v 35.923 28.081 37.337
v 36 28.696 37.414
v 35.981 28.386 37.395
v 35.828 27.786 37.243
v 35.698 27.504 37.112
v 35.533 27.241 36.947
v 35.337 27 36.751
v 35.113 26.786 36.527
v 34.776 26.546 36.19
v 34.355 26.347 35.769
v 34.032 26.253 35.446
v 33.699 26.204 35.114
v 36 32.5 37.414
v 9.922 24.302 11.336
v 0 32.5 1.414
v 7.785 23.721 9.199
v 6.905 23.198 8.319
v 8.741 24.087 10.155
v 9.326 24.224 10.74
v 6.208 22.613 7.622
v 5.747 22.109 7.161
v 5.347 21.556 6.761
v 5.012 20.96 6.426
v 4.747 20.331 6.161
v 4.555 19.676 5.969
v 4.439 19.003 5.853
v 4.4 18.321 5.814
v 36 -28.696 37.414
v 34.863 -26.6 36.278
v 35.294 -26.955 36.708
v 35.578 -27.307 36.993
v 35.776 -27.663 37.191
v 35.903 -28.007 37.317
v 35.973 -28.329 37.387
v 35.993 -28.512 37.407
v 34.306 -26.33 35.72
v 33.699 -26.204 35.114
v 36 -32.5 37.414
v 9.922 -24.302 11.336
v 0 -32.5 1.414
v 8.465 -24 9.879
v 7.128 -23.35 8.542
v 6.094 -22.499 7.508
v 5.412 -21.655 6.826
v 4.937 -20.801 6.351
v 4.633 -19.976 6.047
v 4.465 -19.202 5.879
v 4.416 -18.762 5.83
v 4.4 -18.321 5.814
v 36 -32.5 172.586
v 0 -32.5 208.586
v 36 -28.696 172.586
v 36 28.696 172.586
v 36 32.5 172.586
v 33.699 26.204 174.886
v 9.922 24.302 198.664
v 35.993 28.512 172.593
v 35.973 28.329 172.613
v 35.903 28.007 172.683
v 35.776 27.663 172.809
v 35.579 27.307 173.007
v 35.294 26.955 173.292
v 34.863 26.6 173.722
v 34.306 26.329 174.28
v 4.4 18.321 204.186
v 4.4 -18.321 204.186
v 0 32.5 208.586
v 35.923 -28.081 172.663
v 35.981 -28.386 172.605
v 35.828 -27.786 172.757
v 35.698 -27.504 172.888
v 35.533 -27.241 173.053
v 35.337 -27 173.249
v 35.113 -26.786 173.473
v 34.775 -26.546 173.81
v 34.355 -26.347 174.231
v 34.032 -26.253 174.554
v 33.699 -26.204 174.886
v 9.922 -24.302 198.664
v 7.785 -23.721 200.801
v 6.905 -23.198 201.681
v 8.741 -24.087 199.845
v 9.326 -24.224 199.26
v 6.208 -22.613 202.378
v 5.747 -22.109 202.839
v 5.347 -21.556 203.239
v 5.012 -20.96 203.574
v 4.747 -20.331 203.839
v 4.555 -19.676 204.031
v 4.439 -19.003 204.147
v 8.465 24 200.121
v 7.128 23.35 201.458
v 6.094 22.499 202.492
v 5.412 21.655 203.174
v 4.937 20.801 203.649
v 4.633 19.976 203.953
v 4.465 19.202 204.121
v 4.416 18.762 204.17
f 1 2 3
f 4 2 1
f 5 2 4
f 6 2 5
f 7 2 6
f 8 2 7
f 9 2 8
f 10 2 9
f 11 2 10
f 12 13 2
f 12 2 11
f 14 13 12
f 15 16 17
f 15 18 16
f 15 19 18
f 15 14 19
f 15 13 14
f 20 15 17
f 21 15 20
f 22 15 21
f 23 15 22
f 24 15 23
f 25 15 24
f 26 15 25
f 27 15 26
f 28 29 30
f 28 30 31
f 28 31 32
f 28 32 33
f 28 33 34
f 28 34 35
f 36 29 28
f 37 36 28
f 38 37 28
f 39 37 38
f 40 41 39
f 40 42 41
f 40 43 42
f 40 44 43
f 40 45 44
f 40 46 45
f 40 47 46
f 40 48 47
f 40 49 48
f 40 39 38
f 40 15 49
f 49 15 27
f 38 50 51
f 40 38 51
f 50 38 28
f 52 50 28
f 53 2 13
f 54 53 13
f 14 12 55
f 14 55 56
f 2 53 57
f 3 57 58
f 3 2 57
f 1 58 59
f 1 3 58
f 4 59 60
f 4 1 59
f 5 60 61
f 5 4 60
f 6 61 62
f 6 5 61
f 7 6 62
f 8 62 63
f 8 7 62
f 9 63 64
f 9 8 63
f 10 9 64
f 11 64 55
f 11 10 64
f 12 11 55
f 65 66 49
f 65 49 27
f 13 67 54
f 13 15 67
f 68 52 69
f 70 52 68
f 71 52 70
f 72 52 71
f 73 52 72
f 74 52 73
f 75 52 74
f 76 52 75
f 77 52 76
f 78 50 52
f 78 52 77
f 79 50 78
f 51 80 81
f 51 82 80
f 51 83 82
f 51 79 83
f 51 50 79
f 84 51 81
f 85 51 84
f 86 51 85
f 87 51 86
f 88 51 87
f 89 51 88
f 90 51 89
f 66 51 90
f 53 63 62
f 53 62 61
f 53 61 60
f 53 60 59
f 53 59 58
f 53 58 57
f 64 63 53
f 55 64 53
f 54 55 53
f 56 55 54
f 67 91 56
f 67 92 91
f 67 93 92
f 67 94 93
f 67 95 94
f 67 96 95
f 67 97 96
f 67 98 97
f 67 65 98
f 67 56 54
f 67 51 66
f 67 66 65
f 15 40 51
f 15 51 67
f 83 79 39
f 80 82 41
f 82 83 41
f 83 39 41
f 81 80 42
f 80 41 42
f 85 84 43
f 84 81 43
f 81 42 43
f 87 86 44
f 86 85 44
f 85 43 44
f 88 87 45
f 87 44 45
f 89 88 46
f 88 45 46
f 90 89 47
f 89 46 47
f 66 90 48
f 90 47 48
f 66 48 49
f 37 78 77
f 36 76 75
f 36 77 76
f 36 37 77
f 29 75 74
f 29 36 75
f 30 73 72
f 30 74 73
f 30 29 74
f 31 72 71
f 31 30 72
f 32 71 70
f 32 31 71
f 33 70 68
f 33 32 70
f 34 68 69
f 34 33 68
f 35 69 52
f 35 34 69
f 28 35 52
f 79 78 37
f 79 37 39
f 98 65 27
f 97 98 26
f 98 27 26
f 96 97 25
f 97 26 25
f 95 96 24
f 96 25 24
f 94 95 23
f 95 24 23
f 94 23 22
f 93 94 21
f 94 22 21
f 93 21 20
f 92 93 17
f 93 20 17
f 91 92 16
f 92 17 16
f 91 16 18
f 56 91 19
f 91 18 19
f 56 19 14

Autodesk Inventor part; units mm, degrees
ref_plane "Начальная плоскость" through (0, 0, 1.4142) normal (0, 0, 1) x (1, 0, 0)
ref_plane "Конечная плоскость" through (0, 0, 208.5858) normal (0, 0, 1) x (1, 0, 0)
sketch "Эскиз" plane through (0, 0, 0) normal (0, 0, 1) x (1, 0, 0)
  line L0 (36, -32.5) -> (0, -32.5)
  line L1 (36, -32.5) -> (36, -28.696)
  line L2 (33.6994, -26.2039) -> (9.9215, -24.3017)
  line L3 (4.4, -18.3208) -> (4.4, 18.3208)
  line L4 (33.6994, 26.2039) -> (9.9215, 24.3017)
  line L5 (36, 28.696) -> (36, 32.5)
  line L6 (0, 32.5) -> (36, 32.5)
  line L7 (0, -32.5) -> (0, 32.5)
  arc A0 (4.4, -18.3208) -> (9.9215, -24.3017) centre (10.4, -18.3208) ccw
  arc A1 (9.9215, 24.3017) -> (4.4, 18.3208) centre (10.4, 18.3208) ccw
  arc A2 (36, -28.696) -> (33.6994, -26.2039) centre (33.5, -28.696) ccw
  arc A3 (33.6994, 26.2039) -> (36, 28.696) centre (33.5, 28.696) ccw
  line L8 (0, 45.5) -> (0, -45.5) construction
  line L9 (-7.2974, 0) -> (43.7847, 0) construction
  point P0 (36, -26.388)
  point P1 (4.4, -23.86)
  point P2 (4.4, 23.86)
  point P3 (36, 26.388)
  dimension "d3" = 36
  dimension "d5" = 4.4
  dimension "d7" = 65
  dimension "d9" = 8.64
  dimension "d11" = 8.64
  dimension "d13" = 6.112
  dimension "d15" = 6.112
  dimension "d22" = 6
  dimension "d23" = 2.5
  dimension "d24" = 32.5
  dimension "d25" = 0
extrude "Тело" add sketch "Эскиз" along normal up to surface (207.1716 mm away) from surface at 1.4142
sketch "Sketch3" plane through (0, 0, 0) normal (0, 0, 1) x (1, 0, 0)
  line L0 (0, 0) -> (10, 0)
ref_plane "Work Plane7" through (0, 0, 0) normal (0, -1, 0) x (1, 0, 0)
sketch "Sketch4" plane through (0, 0, 0) normal (0, -1, 0) x (1, 0, 0)
  line L0 (-2, 1.4142) -> (12, 1.4142)
  line L1 (-2, 208.5858) -> (12, 208.5858)
  dimension "d29" = 207.1716
ref_plane "РабПлоскость8" through (-0.7071, 0, 209.2929) normal (0.7071, 0, 0.7071) x (0.7071, 0, -0.7071)
split "Разделение1" plane through (-0.7071, 0, 209.2929) removes the side toward (0.7071, 0, 0.7071)
ref_plane "РабПлоскость9" through (-0.7071, 0, 0.7071) normal (0.7071, 0, -0.7071) x (-0.7071, 0, -0.7071)
split "Разделение2" plane through (-0.7071, 0, 0.7071) removes the side toward (0.7071, 0, -0.7071)
equation "\"d3\" = b"
equation "\"d5\" = t1"
equation "\"d7\" = ParH"
equation "\"d9\" = msp_x1 + t2"
equation "\"d11\" = msp_x1 + t2"
equation "\"d13\" = -msp_x2 + t2"
equation "\"d15\" = -msp_x2 + t2"
equation "\"d22\" = R"
equation "\"d23\" = R1"
equation "\"d24\" = 0.5 * d7"
equation "\"d16\" = G_L"
equation "\"R1\" = 2.5"
equation "\"R\" = 6"
equation "\"t1\" = 4.4"
equation "\"t2\" = 7.2"
equation "\"ParH\" = 65"
equation "\"b\" = 36"
equation "\"msp_x1\" = 0.04 * b"
equation "\"msp_x2\" = -0.08 * t1 + 0.04 * b"
equation "\"G_L\" = d29"
equation "\"ex\" = 0"
equation "\"G_OFFSET_START\" = -1.41421"
equation "\"G_OFFSET_END\" = -1.41421"
equation "\"d26\" = -G_OFFSET_START"
equation "\"d27\" = G_OFFSET_END + B_L"
equation "\"B_L\" = 210"
properties part number "Швеллер 6.5U-207,17 ГОСТ 8240-97" material "Сталь, мягкая, сварочная"
